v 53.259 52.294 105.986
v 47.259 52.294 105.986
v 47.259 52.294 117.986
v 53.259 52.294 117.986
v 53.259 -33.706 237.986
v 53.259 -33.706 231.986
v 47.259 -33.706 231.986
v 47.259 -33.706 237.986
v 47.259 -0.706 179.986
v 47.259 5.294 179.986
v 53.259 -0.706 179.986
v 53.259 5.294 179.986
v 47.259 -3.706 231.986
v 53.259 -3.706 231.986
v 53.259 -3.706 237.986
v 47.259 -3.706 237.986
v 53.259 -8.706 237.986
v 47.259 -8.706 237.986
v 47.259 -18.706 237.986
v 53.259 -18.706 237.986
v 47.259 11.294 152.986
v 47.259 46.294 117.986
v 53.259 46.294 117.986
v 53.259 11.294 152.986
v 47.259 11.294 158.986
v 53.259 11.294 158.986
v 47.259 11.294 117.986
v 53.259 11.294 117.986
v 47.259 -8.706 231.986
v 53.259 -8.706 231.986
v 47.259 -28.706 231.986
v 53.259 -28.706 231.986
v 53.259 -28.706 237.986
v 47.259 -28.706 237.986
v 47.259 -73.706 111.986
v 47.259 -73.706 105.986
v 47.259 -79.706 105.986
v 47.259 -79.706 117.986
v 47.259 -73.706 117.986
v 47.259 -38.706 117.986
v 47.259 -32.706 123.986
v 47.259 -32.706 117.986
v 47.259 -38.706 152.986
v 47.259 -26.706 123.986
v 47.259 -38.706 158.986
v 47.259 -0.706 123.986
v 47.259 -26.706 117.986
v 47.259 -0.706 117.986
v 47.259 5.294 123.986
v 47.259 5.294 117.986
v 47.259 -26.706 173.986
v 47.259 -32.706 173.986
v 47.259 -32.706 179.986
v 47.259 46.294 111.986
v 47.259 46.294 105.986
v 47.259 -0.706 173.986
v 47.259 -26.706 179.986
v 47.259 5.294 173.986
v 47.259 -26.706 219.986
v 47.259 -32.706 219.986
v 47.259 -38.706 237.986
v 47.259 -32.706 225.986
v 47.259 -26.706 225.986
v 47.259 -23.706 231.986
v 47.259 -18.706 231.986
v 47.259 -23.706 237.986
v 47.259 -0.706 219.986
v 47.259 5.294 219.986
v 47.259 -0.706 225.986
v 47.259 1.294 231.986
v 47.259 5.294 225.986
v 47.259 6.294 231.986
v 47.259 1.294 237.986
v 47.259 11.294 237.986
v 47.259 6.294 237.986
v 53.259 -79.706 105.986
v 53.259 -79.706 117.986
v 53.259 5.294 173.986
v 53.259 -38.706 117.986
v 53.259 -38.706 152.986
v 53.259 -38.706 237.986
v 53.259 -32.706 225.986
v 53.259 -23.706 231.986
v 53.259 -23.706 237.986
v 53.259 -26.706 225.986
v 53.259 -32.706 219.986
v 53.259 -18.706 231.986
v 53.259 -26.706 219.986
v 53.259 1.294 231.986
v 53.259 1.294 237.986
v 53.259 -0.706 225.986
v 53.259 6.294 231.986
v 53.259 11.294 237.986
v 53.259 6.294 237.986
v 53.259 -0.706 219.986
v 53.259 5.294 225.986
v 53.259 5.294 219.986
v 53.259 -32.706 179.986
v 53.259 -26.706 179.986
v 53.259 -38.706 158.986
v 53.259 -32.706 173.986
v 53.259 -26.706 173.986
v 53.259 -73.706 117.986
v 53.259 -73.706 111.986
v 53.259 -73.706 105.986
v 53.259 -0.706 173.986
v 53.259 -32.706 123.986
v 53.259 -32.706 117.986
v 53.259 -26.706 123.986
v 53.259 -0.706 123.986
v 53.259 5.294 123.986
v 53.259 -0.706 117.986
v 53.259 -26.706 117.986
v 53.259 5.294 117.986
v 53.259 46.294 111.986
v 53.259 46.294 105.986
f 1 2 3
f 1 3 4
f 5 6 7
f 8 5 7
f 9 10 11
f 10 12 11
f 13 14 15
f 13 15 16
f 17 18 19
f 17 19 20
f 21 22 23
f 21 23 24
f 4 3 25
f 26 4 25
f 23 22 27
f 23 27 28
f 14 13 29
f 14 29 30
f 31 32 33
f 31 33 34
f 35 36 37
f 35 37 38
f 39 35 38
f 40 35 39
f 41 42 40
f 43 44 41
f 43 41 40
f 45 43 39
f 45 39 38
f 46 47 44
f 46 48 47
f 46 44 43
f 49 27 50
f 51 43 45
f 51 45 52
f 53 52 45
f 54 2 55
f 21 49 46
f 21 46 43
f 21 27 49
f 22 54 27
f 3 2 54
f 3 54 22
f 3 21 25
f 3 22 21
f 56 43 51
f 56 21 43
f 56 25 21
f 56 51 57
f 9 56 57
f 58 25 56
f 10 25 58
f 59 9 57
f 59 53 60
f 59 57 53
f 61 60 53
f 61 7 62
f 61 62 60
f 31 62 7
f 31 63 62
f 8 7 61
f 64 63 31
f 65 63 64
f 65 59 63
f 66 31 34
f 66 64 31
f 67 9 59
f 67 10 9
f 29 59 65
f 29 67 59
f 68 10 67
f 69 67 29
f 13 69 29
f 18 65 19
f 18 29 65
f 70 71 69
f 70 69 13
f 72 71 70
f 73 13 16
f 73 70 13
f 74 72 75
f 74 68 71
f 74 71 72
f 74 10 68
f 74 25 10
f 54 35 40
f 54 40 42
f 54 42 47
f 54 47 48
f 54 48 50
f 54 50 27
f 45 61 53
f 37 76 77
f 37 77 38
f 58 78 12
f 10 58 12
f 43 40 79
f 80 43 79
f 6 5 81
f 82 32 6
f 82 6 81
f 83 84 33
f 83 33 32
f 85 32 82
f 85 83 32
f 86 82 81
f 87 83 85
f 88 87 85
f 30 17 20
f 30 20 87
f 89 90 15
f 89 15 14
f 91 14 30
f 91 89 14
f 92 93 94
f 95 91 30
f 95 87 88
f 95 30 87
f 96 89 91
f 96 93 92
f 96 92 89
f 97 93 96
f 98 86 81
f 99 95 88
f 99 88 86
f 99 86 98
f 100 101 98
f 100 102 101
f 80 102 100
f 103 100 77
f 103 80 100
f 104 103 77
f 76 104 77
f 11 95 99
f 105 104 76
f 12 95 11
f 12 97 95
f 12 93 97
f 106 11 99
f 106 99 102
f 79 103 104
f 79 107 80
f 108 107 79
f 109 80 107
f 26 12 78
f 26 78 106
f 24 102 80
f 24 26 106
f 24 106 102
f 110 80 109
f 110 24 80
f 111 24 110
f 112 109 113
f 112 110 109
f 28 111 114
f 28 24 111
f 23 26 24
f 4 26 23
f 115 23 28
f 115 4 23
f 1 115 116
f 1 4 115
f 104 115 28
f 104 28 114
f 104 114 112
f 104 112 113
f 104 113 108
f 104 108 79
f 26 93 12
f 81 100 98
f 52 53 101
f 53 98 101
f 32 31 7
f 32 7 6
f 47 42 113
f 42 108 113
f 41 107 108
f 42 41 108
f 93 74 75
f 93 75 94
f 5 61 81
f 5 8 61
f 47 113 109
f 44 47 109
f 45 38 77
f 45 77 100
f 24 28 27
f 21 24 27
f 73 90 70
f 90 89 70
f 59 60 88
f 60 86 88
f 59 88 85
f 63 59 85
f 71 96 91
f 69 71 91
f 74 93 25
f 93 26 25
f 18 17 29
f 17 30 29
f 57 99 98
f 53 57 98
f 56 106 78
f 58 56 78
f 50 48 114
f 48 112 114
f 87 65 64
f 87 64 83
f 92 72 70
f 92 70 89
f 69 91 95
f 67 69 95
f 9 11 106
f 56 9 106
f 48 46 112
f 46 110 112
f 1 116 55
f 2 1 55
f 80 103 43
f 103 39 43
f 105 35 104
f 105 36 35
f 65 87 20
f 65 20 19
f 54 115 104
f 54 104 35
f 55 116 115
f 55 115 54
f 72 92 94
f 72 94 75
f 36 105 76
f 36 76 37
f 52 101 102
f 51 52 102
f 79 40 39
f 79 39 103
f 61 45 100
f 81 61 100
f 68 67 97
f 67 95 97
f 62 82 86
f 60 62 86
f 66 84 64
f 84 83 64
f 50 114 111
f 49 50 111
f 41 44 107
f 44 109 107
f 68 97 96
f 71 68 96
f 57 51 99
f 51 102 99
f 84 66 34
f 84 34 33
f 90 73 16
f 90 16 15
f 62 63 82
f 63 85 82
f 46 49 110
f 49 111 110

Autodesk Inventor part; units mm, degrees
ref_plane "YZ Plane" through (0, 0, 0) normal (1, 0, 0) x (0, 1, 0)
ref_plane "XZ Plane" through (0, 0, 0) normal (0, 1, 0) x (-1, 0, 0)
ref_plane "XY Plane" through (0, 0, 0) normal (0, 0, 1) x (1, 0, 0)
ref_plane "Work Plane1" through (341.8591, 61.2945, 111.9858) normal (0, 0, 1) x (-1, 0, 0)
sketch "Sketch1" plane through (341.8591, 61.2945, 111.9858) normal (0, 0, 1) x (-1, 0, 0)
  line L0 (-28.8, 19.9) -> (-22.6, 19.9)
  line L1 (-28.8, 3) -> (-28.8, 19.9)
  line L2 (-28.8, 3) -> (262.8, 3)
  line L3 (262.8, 3) -> (262.8, -3)
  line L4 (262.8, -3) -> (-28.8, -3)
  line L5 (-28.8, -19.9) -> (-28.8, -3)
  line L6 (-13.3962, -19.9) -> (-28.8, -19.9)
  line L7 (-8.2, -22.9) -> (-13.3962, -19.9)
  line L8 (-8.2, -19.9) -> (-8.2, -22.9)
  arc A0 (-6.2, -19.9) -> (-8.2, -19.9) centre (-7.2, -19.9) ccw
  line L9 (-6.2, -22.9) -> (-6.2, -19.9)
  line L10 (-1.0038, -19.9) -> (-6.2, -22.9)
  line L11 (15.4038, -19.9) -> (-1.0038, -19.9)
  line L12 (20.6, -22.9) -> (15.4038, -19.9)
  line L13 (20.6, -19.9) -> (20.6, -22.9)
  arc A1 (22.6, -19.9) -> (20.6, -19.9) centre (21.6, -19.9) ccw
  line L14 (22.6, -22.9) -> (22.6, -19.9)
  line L15 (27.7962, -19.9) -> (22.6, -22.9)
  line L16 (44.2038, -19.9) -> (27.7962, -19.9)
  line L17 (49.4, -22.9) -> (44.2038, -19.9)
  line L18 (49.4, -19.9) -> (49.4, -22.9)
  arc A2 (51.4, -19.9) -> (49.4, -19.9) centre (50.4, -19.9) ccw
  line L19 (51.4, -22.9) -> (51.4, -19.9)
  line L20 (56.5962, -19.9) -> (51.4, -22.9)
  line L21 (73.0038, -19.9) -> (56.5962, -19.9)
  line L22 (78.2, -22.9) -> (73.0038, -19.9)
  line L23 (78.2, -19.9) -> (78.2, -22.9)
  arc A3 (80.2, -19.9) -> (78.2, -19.9) centre (79.2, -19.9) ccw
  line L24 (80.2, -22.9) -> (80.2, -19.9)
  line L25 (85.3962, -19.9) -> (80.2, -22.9)
  line L26 (101.8038, -19.9) -> (85.3962, -19.9)
  line L27 (107, -22.9) -> (101.8038, -19.9)
  line L28 (107, -19.9) -> (107, -22.9)
  arc A4 (109, -19.9) -> (107, -19.9) centre (108, -19.9) ccw
  line L29 (109, -22.9) -> (109, -19.9)
  line L30 (114.1962, -19.9) -> (109, -22.9)
  line L31 (130.6038, -19.9) -> (114.1962, -19.9)
  line L32 (135.8, -22.9) -> (130.6038, -19.9)
  line L33 (135.8, -19.9) -> (135.8, -22.9)
  arc A5 (137.8, -19.9) -> (135.8, -19.9) centre (136.8, -19.9) ccw
  line L34 (137.8, -22.9) -> (137.8, -19.9)
  line L35 (142.9962, -19.9) -> (137.8, -22.9)
  line L36 (159.4038, -19.9) -> (142.9962, -19.9)
  line L37 (164.6, -22.9) -> (159.4038, -19.9)
  line L38 (164.6, -19.9) -> (164.6, -22.9)
  arc A6 (166.6, -19.9) -> (164.6, -19.9) centre (165.6, -19.9) ccw
  line L39 (166.6, -22.9) -> (166.6, -19.9)
  line L40 (171.7962, -19.9) -> (166.6, -22.9)
  line L41 (188.2038, -19.9) -> (171.7962, -19.9)
  line L42 (193.4, -22.9) -> (188.2038, -19.9)
  line L43 (193.4, -19.9) -> (193.4, -22.9)
  arc A7 (195.4, -19.9) -> (193.4, -19.9) centre (194.4, -19.9) ccw
  line L44 (195.4, -22.9) -> (195.4, -19.9)
  line L45 (200.5962, -19.9) -> (195.4, -22.9)
  line L46 (217.0038, -19.9) -> (200.5962, -19.9)
  line L47 (222.2, -22.9) -> (217.0038, -19.9)
  line L48 (222.2, -19.9) -> (222.2, -22.9)
  arc A8 (224.2, -19.9) -> (222.2, -19.9) centre (223.2, -19.9) ccw
  line L49 (224.2, -22.9) -> (224.2, -19.9)
  line L50 (229.3962, -19.9) -> (224.2, -22.9)
  line L51 (245.8038, -19.9) -> (229.3962, -19.9)
  line L52 (251, -22.9) -> (245.8038, -19.9)
  line L53 (251, -19.9) -> (251, -22.9)
  arc A9 (253, -19.9) -> (251, -19.9) centre (252, -19.9) ccw
  line L54 (253, -22.9) -> (253, -19.9)
  line L55 (258.1962, -19.9) -> (253, -22.9)
  line L56 (274.6038, -19.9) -> (258.1962, -19.9)
  line L57 (279.8, -22.9) -> (274.6038, -19.9)
  line L58 (279.8, -19.9) -> (279.8, -22.9)
  arc A10 (281.8, -19.9) -> (279.8, -19.9) centre (280.8, -19.9) ccw
  line L59 (281.8, -22.9) -> (281.8, -19.9)
  line L60 (286.9962, -19.9) -> (281.8, -22.9)
  line L61 (303.4038, -19.9) -> (286.9962, -19.9)
  line L62 (308.6, -22.9) -> (303.4038, -19.9)
  line L63 (308.6, -19.9) -> (308.6, -22.9)
  arc A11 (310.6, -19.9) -> (308.6, -19.9) centre (309.6, -19.9) ccw
  line L64 (310.6, -22.9) -> (310.6, -19.9)
  line L65 (315.7962, -19.9) -> (310.6, -22.9)
  line L66 (332.2038, -19.9) -> (315.7962, -19.9)
  line L67 (337.4, -22.9) -> (332.2038, -19.9)
  line L68 (337.4, -19.9) -> (337.4, -22.9)
  arc A12 (339.4, -19.9) -> (337.4, -19.9) centre (338.4, -19.9) ccw
  line L69 (339.4, -22.9) -> (339.4, -19.9)
  line L70 (344.5962, -19.9) -> (339.4, -22.9)
  line L71 (361.0038, -19.9) -> (344.5962, -19.9)
  line L72 (366.2, -22.9) -> (361.0038, -19.9)
  line L73 (366.2, -19.9) -> (366.2, -22.9)
  arc A13 (368.2, -19.9) -> (366.2, -19.9) centre (367.2, -19.9) ccw
  line L74 (368.2, -22.9) -> (368.2, -19.9)
  line L75 (373.3962, -19.9) -> (368.2, -22.9)
  line L76 (389.8038, -19.9) -> (373.3962, -19.9)
  line L77 (395, -22.9) -> (389.8038, -19.9)
  line L78 (395, -19.9) -> (395, -22.9)
  arc A14 (397, -19.9) -> (395, -19.9) centre (396, -19.9) ccw
  line L79 (397, -22.9) -> (397, -19.9)
  line L80 (402.1962, -19.9) -> (397, -22.9)
  line L81 (418.6038, -19.9) -> (402.1962, -19.9)
  line L82 (423.8, -22.9) -> (418.6038, -19.9)
  line L83 (423.8, -19.9) -> (423.8, -22.9)
  arc A15 (425.8, -19.9) -> (423.8, -19.9) centre (424.8, -19.9) ccw
  line L84 (425.8, -22.9) -> (425.8, -19.9)
  line L85 (430.9962, -19.9) -> (425.8, -22.9)
  line L86 (447.4038, -19.9) -> (430.9962, -19.9)
  line L87 (452.6, -22.9) -> (447.4038, -19.9)
  line L88 (452.6, -19.9) -> (452.6, -22.9)
  arc A16 (454.6, -19.9) -> (452.6, -19.9) centre (453.6, -19.9) ccw
  line L89 (454.6, -22.9) -> (454.6, -19.9)
  line L90 (459.7962, -19.9) -> (454.6, -22.9)
  line L91 (476.2038, -19.9) -> (459.7962, -19.9)
  line L92 (481.4, -22.9) -> (476.2038, -19.9)
  line L93 (481.4, -19.9) -> (481.4, -22.9)
  arc A17 (483.4, -19.9) -> (481.4, -19.9) centre (482.4, -19.9) ccw
  line L94 (483.4, -22.9) -> (483.4, -19.9)
  line L95 (488.5962, -19.9) -> (483.4, -22.9)
  line L96 (505.0038, -19.9) -> (488.5962, -19.9)
  line L97 (510.2, -22.9) -> (505.0038, -19.9)
  line L98 (510.2, -19.9) -> (510.2, -22.9)
  arc A18 (512.2, -19.9) -> (510.2, -19.9) centre (511.2, -19.9) ccw
  line L99 (512.2, -22.9) -> (512.2, -19.9)
  line L100 (517.3962, -19.9) -> (512.2, -22.9)
  line L101 (533.8038, -19.9) -> (517.3962, -19.9)
  line L102 (539, -22.9) -> (533.8038, -19.9)
  line L103 (539, -19.9) -> (539, -22.9)
  arc A19 (541, -19.9) -> (539, -19.9) centre (540, -19.9) ccw
  line L104 (541, -22.9) -> (541, -19.9)
  line L105 (546.1962, -19.9) -> (541, -22.9)
  line L106 (546.1962, -19.9) -> (554.4, -19.9)
  line L107 (554.4, 19.9) -> (554.4, -19.9)
  line L108 (531.7962, 19.9) -> (554.4, 19.9)
  line L109 (526.6, 22.9) -> (531.7962, 19.9)
  line L110 (526.6, 19.9) -> (526.6, 22.9)
  arc A20 (524.6, 19.9) -> (526.6, 19.9) centre (525.6, 19.9) ccw
  line L111 (524.6, 22.9) -> (524.6, 19.9)
  line L112 (519.4038, 19.9) -> (524.6, 22.9)
  line L113 (502.9962, 19.9) -> (519.4038, 19.9)
  line L114 (497.8, 22.9) -> (502.9962, 19.9)
  line L115 (497.8, 19.9) -> (497.8, 22.9)
  arc A21 (495.8, 19.9) -> (497.8, 19.9) centre (496.8, 19.9) ccw
  line L116 (495.8, 22.9) -> (495.8, 19.9)
  line L117 (490.6038, 19.9) -> (495.8, 22.9)
  line L118 (474.1962, 19.9) -> (490.6038, 19.9)
  line L119 (469, 22.9) -> (474.1962, 19.9)
  line L120 (469, 19.9) -> (469, 22.9)
  arc A22 (467, 19.9) -> (469, 19.9) centre (468, 19.9) ccw
  line L121 (467, 22.9) -> (467, 19.9)
  line L122 (461.8038, 19.9) -> (467, 22.9)
  line L123 (445.3962, 19.9) -> (461.8038, 19.9)
  line L124 (440.2, 22.9) -> (445.3962, 19.9)
  line L125 (440.2, 19.9) -> (440.2, 22.9)
  arc A23 (438.2, 19.9) -> (440.2, 19.9) centre (439.2, 19.9) ccw
  line L126 (438.2, 22.9) -> (438.2, 19.9)
  line L127 (433.0038, 19.9) -> (438.2, 22.9)
  line L128 (416.5962, 19.9) -> (433.0038, 19.9)
  line L129 (411.4, 22.9) -> (416.5962, 19.9)
  line L130 (411.4, 19.9) -> (411.4, 22.9)
  arc A24 (409.4, 19.9) -> (411.4, 19.9) centre (410.4, 19.9) ccw
  line L131 (409.4, 22.9) -> (409.4, 19.9)
  line L132 (404.2038, 19.9) -> (409.4, 22.9)
  line L133 (387.7962, 19.9) -> (404.2038, 19.9)
  line L134 (382.6, 22.9) -> (387.7962, 19.9)
  line L135 (382.6, 19.9) -> (382.6, 22.9)
  arc A25 (380.6, 19.9) -> (382.6, 19.9) centre (381.6, 19.9) ccw
  line L136 (380.6, 22.9) -> (380.6, 19.9)
  line L137 (375.4038, 19.9) -> (380.6, 22.9)
  line L138 (358.9962, 19.9) -> (375.4038, 19.9)
  line L139 (353.8, 22.9) -> (358.9962, 19.9)
  line L140 (353.8, 19.9) -> (353.8, 22.9)
  arc A26 (351.8, 19.9) -> (353.8, 19.9) centre (352.8, 19.9) ccw
  line L141 (351.8, 22.9) -> (351.8, 19.9)
  line L142 (346.6038, 19.9) -> (351.8, 22.9)
  line L143 (330.1962, 19.9) -> (346.6038, 19.9)
  line L144 (325, 22.9) -> (330.1962, 19.9)
  line L145 (325, 19.9) -> (325, 22.9)
  arc A27 (323, 19.9) -> (325, 19.9) centre (324, 19.9) ccw
  line L146 (323, 22.9) -> (323, 19.9)
  line L147 (317.8038, 19.9) -> (323, 22.9)
  line L148 (301.3962, 19.9) -> (317.8038, 19.9)
  line L149 (296.2, 22.9) -> (301.3962, 19.9)
  line L150 (296.2, 19.9) -> (296.2, 22.9)
  arc A28 (294.2, 19.9) -> (296.2, 19.9) centre (295.2, 19.9) ccw
  line L151 (294.2, 22.9) -> (294.2, 19.9)
  line L152 (289.0038, 19.9) -> (294.2, 22.9)
  line L153 (272.5962, 19.9) -> (289.0038, 19.9)
  line L154 (267.4, 22.9) -> (272.5962, 19.9)
  line L155 (267.4, 19.9) -> (267.4, 22.9)
  arc A29 (265.4, 19.9) -> (267.4, 19.9) centre (266.4, 19.9) ccw
  line L156 (265.4, 22.9) -> (265.4, 19.9)
  line L157 (260.2038, 19.9) -> (265.4, 22.9)
  line L158 (243.7962, 19.9) -> (260.2038, 19.9)
  line L159 (238.6, 22.9) -> (243.7962, 19.9)
  line L160 (238.6, 19.9) -> (238.6, 22.9)
  arc A30 (236.6, 19.9) -> (238.6, 19.9) centre (237.6, 19.9) ccw
  line L161 (236.6, 22.9) -> (236.6, 19.9)
  line L162 (231.4038, 19.9) -> (236.6, 22.9)
  line L163 (214.9962, 19.9) -> (231.4038, 19.9)
  line L164 (209.8, 22.9) -> (214.9962, 19.9)
  line L165 (209.8, 19.9) -> (209.8, 22.9)
  arc A31 (207.8, 19.9) -> (209.8, 19.9) centre (208.8, 19.9) ccw
  line L166 (207.8, 22.9) -> (207.8, 19.9)
  line L167 (202.6038, 19.9) -> (207.8, 22.9)
  line L168 (186.1962, 19.9) -> (202.6038, 19.9)
  line L169 (181, 22.9) -> (186.1962, 19.9)
  line L170 (181, 19.9) -> (181, 22.9)
  arc A32 (179, 19.9) -> (181, 19.9) centre (180, 19.9) ccw
  line L171 (179, 22.9) -> (179, 19.9)
  line L172 (173.8038, 19.9) -> (179, 22.9)
  line L173 (157.3962, 19.9) -> (173.8038, 19.9)
  line L174 (152.2, 22.9) -> (157.3962, 19.9)
  line L175 (152.2, 19.9) -> (152.2, 22.9)
  arc A33 (150.2, 19.9) -> (152.2, 19.9) centre (151.2, 19.9) ccw
  line L176 (150.2, 22.9) -> (150.2, 19.9)
  line L177 (145.0038, 19.9) -> (150.2, 22.9)
  line L178 (128.5962, 19.9) -> (145.0038, 19.9)
  line L179 (123.4, 22.9) -> (128.5962, 19.9)
  line L180 (123.4, 19.9) -> (123.4, 22.9)
  arc A34 (121.4, 19.9) -> (123.4, 19.9) centre (122.4, 19.9) ccw
  line L181 (121.4, 22.9) -> (121.4, 19.9)
  line L182 (116.2038, 19.9) -> (121.4, 22.9)
  line L183 (99.7962, 19.9) -> (116.2038, 19.9)
  line L184 (94.6, 22.9) -> (99.7962, 19.9)
  line L185 (94.6, 19.9) -> (94.6, 22.9)
  arc A35 (92.6, 19.9) -> (94.6, 19.9) centre (93.6, 19.9) ccw
  line L186 (92.6, 22.9) -> (92.6, 19.9)
  line L187 (87.4038, 19.9) -> (92.6, 22.9)
  line L188 (70.9962, 19.9) -> (87.4038, 19.9)
  line L189 (65.8, 22.9) -> (70.9962, 19.9)
  line L190 (65.8, 19.9) -> (65.8, 22.9)
  arc A36 (63.8, 19.9) -> (65.8, 19.9) centre (64.8, 19.9) ccw
  line L191 (63.8, 22.9) -> (63.8, 19.9)
  line L192 (58.6038, 19.9) -> (63.8, 22.9)
  line L193 (42.1962, 19.9) -> (58.6038, 19.9)
  line L194 (37, 22.9) -> (42.1962, 19.9)
  line L195 (37, 19.9) -> (37, 22.9)
  arc A37 (35, 19.9) -> (37, 19.9) centre (36, 19.9) ccw
  line L196 (35, 22.9) -> (35, 19.9)
  line L197 (29.8038, 19.9) -> (35, 22.9)
  line L198 (13.3962, 19.9) -> (29.8038, 19.9)
  line L199 (8.2, 22.9) -> (13.3962, 19.9)
  line L200 (8.2, 19.9) -> (8.2, 22.9)
  arc A38 (6.2, 19.9) -> (8.2, 19.9) centre (7.2, 19.9) ccw
  line L201 (6.2, 22.9) -> (6.2, 19.9)
  line L202 (1.0038, 19.9) -> (6.2, 22.9)
  line L203 (-15.4038, 19.9) -> (1.0038, 19.9)
  line L204 (-20.6, 22.9) -> (-15.4038, 19.9)
  line L205 (-20.6, 19.9) -> (-20.6, 22.9)
  arc A39 (-22.6, 19.9) -> (-20.6, 19.9) centre (-21.6, 19.9) ccw
  line L206 (525, 9) -> (519, 9)
  line L207 (519, 9) -> (519, 15)
  line L208 (519, 15) -> (525, 15)
  line L209 (525, 15) -> (525, 9)
  line L210 (525, -9) -> (525, -15)
  line L211 (525, -15) -> (519, -15)
  line L212 (519, -15) -> (519, -9)
  line L213 (519, -9) -> (525, -9)
  line L214 (467.4, 9) -> (461.4, 9)
  line L215 (461.4, 9) -> (461.4, 15)
  line L216 (461.4, 15) -> (467.4, 15)
  line L217 (467.4, 15) -> (467.4, 9)
  line L218 (467.4, -9) -> (467.4, -15)
  line L219 (467.4, -15) -> (461.4, -15)
  line L220 (461.4, -15) -> (461.4, -9)
  line L221 (461.4, -9) -> (467.4, -9)
  line L222 (409.8, 9) -> (403.8, 9)
  line L223 (403.8, 9) -> (403.8, 15)
  line L224 (403.8, 15) -> (409.8, 15)
  line L225 (409.8, 15) -> (409.8, 9)
  line L226 (409.8, -9) -> (409.8, -15)
  line L227 (409.8, -15) -> (403.8, -15)
  line L228 (403.8, -15) -> (403.8, -9)
  line L229 (403.8, -9) -> (409.8, -9)
  line L230 (352.2, 9) -> (346.2, 9)
  line L231 (346.2, 9) -> (346.2, 15)
  line L232 (346.2, 15) -> (352.2, 15)
  line L233 (352.2, 15) -> (352.2, 9)
  line L234 (352.2, -9) -> (352.2, -15)
  line L235 (352.2, -15) -> (346.2, -15)
  line L236 (346.2, -15) -> (346.2, -9)
  line L237 (346.2, -9) -> (352.2, -9)
  line L238 (294.6, 9) -> (288.6, 9)
  line L239 (288.6, 9) -> (288.6, 15)
  line L240 (288.6, 15) -> (294.6, 15)
  line L241 (294.6, 15) -> (294.6, 9)
  line L242 (294.6, -9) -> (294.6, -15)
  line L243 (294.6, -15) -> (288.6, -15)
  line L244 (288.6, -15) -> (288.6, -9)
  line L245 (288.6, -9) -> (294.6, -9)
  line L246 (237, 9) -> (231, 9)
  line L247 (231, 9) -> (231, 15)
  line L248 (231, 15) -> (237, 15)
  line L249 (237, 15) -> (237, 9)
  line L250 (237, -9) -> (237, -15)
  line L251 (237, -15) -> (231, -15)
  line L252 (231, -15) -> (231, -9)
  line L253 (231, -9) -> (237, -9)
  line L254 (179.4, 9) -> (173.4, 9)
  line L255 (173.4, 9) -> (173.4, 15)
  line L256 (173.4, 15) -> (179.4, 15)
  line L257 (179.4, 15) -> (179.4, 9)
  line L258 (179.4, -9) -> (179.4, -15)
  line L259 (179.4, -15) -> (173.4, -15)
  line L260 (173.4, -15) -> (173.4, -9)
  line L261 (173.4, -9) -> (179.4, -9)
  line L262 (121.8, 9) -> (115.8, 9)
  line L263 (115.8, 9) -> (115.8, 15)
  line L264 (115.8, 15) -> (121.8, 15)
  line L265 (121.8, 15) -> (121.8, 9)
  line L266 (121.8, -9) -> (121.8, -15)
  line L267 (121.8, -15) -> (115.8, -15)
  line L268 (115.8, -15) -> (115.8, -9)
  line L269 (115.8, -9) -> (121.8, -9)
  line L270 (64.2, 9) -> (58.2, 9)
  line L271 (58.2, 9) -> (58.2, 15)
  line L272 (58.2, 15) -> (64.2, 15)
  line L273 (64.2, 15) -> (64.2, 9)
  line L274 (64.2, -9) -> (64.2, -15)
  line L275 (64.2, -15) -> (58.2, -15)
  line L276 (58.2, -15) -> (58.2, -9)
  line L277 (58.2, -9) -> (64.2, -9)
  line L278 (6.6, 9) -> (0.6, 9)
  line L279 (0.6, 9) -> (0.6, 15)
  line L280 (0.6, 15) -> (6.6, 15)
  line L281 (6.6, 15) -> (6.6, 9)
  line L282 (6.6, -9) -> (6.6, -15)
  line L283 (6.6, -15) -> (0.6, -15)
  line L284 (0.6, -15) -> (0.6, -9)
  line L285 (0.6, -9) -> (6.6, -9)
  line L286 (-28.8, 169.9) -> (-22.6, 169.9)
  line L287 (-28.8, 153) -> (-28.8, 169.9)
  line L288 (-28.8, 153) -> (262.8, 153)
  line L289 (262.8, 153) -> (262.8, 147)
  line L290 (262.8, 147) -> (-28.8, 147)
  line L291 (-28.8, 130.1) -> (-28.8, 147)
  line L292 (-13.3962, 130.1) -> (-28.8, 130.1)
  line L293 (-8.2, 127.1) -> (-13.3962, 130.1)
  line L294 (-8.2, 130.1) -> (-8.2, 127.1)
  arc A40 (-6.2, 130.1) -> (-8.2, 130.1) centre (-7.2, 130.1) ccw
  line L295 (-6.2, 127.1) -> (-6.2, 130.1)
  line L296 (-1.0038, 130.1) -> (-6.2, 127.1)
  line L297 (15.4038, 130.1) -> (-1.0038, 130.1)
  line L298 (20.6, 127.1) -> (15.4038, 130.1)
  line L299 (20.6, 130.1) -> (20.6, 127.1)
  arc A41 (22.6, 130.1) -> (20.6, 130.1) centre (21.6, 130.1) ccw
  line L300 (22.6, 127.1) -> (22.6, 130.1)
  line L301 (27.7962, 130.1) -> (22.6, 127.1)
  line L302 (44.2038, 130.1) -> (27.7962, 130.1)
  line L303 (49.4, 127.1) -> (44.2038, 130.1)
  line L304 (49.4, 130.1) -> (49.4, 127.1)
  arc A42 (51.4, 130.1) -> (49.4, 130.1) centre (50.4, 130.1) ccw
  line L305 (51.4, 127.1) -> (51.4, 130.1)
  line L306 (56.5962, 130.1) -> (51.4, 127.1)
  line L307 (73.0038, 130.1) -> (56.5962, 130.1)
  line L308 (78.2, 127.1) -> (73.0038, 130.1)
  line L309 (78.2, 130.1) -> (78.2, 127.1)
  arc A43 (80.2, 130.1) -> (78.2, 130.1) centre (79.2, 130.1) ccw
  line L310 (80.2, 127.1) -> (80.2, 130.1)
  line L311 (85.3962, 130.1) -> (80.2, 127.1)
  line L312 (101.8038, 130.1) -> (85.3962, 130.1)
  line L313 (107, 127.1) -> (101.8038, 130.1)
  line L314 (107, 130.1) -> (107, 127.1)
  arc A44 (109, 130.1) -> (107, 130.1) centre (108, 130.1) ccw
  line L315 (109, 127.1) -> (109, 130.1)
  line L316 (114.1962, 130.1) -> (109, 127.1)
  line L317 (130.6038, 130.1) -> (114.1962, 130.1)
  line L318 (135.8, 127.1) -> (130.6038, 130.1)
  line L319 (135.8, 130.1) -> (135.8, 127.1)
  arc A45 (137.8, 130.1) -> (135.8, 130.1) centre (136.8, 130.1) ccw
  line L320 (137.8, 127.1) -> (137.8, 130.1)
  line L321 (142.9962, 130.1) -> (137.8, 127.1)
  line L322 (159.4038, 130.1) -> (142.9962, 130.1)
  line L323 (164.6, 127.1) -> (159.4038, 130.1)
  line L324 (164.6, 130.1) -> (164.6, 127.1)
  arc A46 (166.6, 130.1) -> (164.6, 130.1) centre (165.6, 130.1) ccw
  line L325 (166.6, 127.1) -> (166.6, 130.1)
  line L326 (171.7962, 130.1) -> (166.6, 127.1)
  line L327 (188.2038, 130.1) -> (171.7962, 130.1)
  line L328 (193.4, 127.1) -> (188.2038, 130.1)
  line L329 (193.4, 130.1) -> (193.4, 127.1)
  arc A47 (195.4, 130.1) -> (193.4, 130.1) centre (194.4, 130.1) ccw
  line L330 (195.4, 127.1) -> (195.4, 130.1)
  line L331 (200.5962, 130.1) -> (195.4, 127.1)
  line L332 (217.0038, 130.1) -> (200.5962, 130.1)
  line L333 (222.2, 127.1) -> (217.0038, 130.1)
  line L334 (222.2, 130.1) -> (222.2, 127.1)
  arc A48 (224.2, 130.1) -> (222.2, 130.1) centre (223.2, 130.1) ccw
  line L335 (224.2, 127.1) -> (224.2, 130.1)
  line L336 (229.3962, 130.1) -> (224.2, 127.1)
  line L337 (245.8038, 130.1) -> (229.3962, 130.1)
  line L338 (251, 127.1) -> (245.8038, 130.1)
  line L339 (251, 130.1) -> (251, 127.1)
  arc A49 (253, 130.1) -> (251, 130.1) centre (252, 130.1) ccw
  line L340 (253, 127.1) -> (253, 130.1)
  line L341 (258.1962, 130.1) -> (253, 127.1)
  line L342 (274.6038, 130.1) -> (258.1962, 130.1)
  line L343 (279.8, 127.1) -> (274.6038, 130.1)
  line L344 (279.8, 130.1) -> (279.8, 127.1)
  arc A50 (281.8, 130.1) -> (279.8, 130.1) centre (280.8, 130.1) ccw
  line L345 (281.8, 127.1) -> (281.8, 130.1)
  line L346 (286.9962, 130.1) -> (281.8, 127.1)
  line L347 (303.4038, 130.1) -> (286.9962, 130.1)
  line L348 (308.6, 127.1) -> (303.4038, 130.1)
  line L349 (308.6, 130.1) -> (308.6, 127.1)
  arc A51 (310.6, 130.1) -> (308.6, 130.1) centre (309.6, 130.1) ccw
  line L350 (310.6, 127.1) -> (310.6, 130.1)
  line L351 (315.7962, 130.1) -> (310.6, 127.1)
  line L352 (332.2038, 130.1) -> (315.7962, 130.1)
  line L353 (337.4, 127.1) -> (332.2038, 130.1)
  line L354 (337.4, 130.1) -> (337.4, 127.1)
  arc A52 (339.4, 130.1) -> (337.4, 130.1) centre (338.4, 130.1) ccw
  line L355 (339.4, 127.1) -> (339.4, 130.1)
  line L356 (344.5962, 130.1) -> (339.4, 127.1)
  line L357 (361.0038, 130.1) -> (344.5962, 130.1)
  line L358 (366.2, 127.1) -> (361.0038, 130.1)
  line L359 (366.2, 130.1) -> (366.2, 127.1)
  arc A53 (368.2, 130.1) -> (366.2, 130.1) centre (367.2, 130.1) ccw
  line L360 (368.2, 127.1) -> (368.2, 130.1)
  line L361 (373.3962, 130.1) -> (368.2, 127.1)
  line L362 (389.8038, 130.1) -> (373.3962, 130.1)
  line L363 (395, 127.1) -> (389.8038, 130.1)
  line L364 (395, 130.1) -> (395, 127.1)
  arc A54 (397, 130.1) -> (395, 130.1) centre (396, 130.1) ccw
  line L365 (397, 127.1) -> (397, 130.1)
  line L366 (402.1962, 130.1) -> (397, 127.1)
  line L367 (418.6038, 130.1) -> (402.1962, 130.1)
  line L368 (423.8, 127.1) -> (418.6038, 130.1)
  line L369 (423.8, 130.1) -> (423.8, 127.1)
  arc A55 (425.8, 130.1) -> (423.8, 130.1) centre (424.8, 130.1) ccw
  line L370 (425.8, 127.1) -> (425.8, 130.1)
  line L371 (430.9962, 130.1) -> (425.8, 127.1)
  line L372 (447.4038, 130.1) -> (430.9962, 130.1)
  line L373 (452.6, 127.1) -> (447.4038, 130.1)
  line L374 (452.6, 130.1) -> (452.6, 127.1)
  arc A56 (454.6, 130.1) -> (452.6, 130.1) centre (453.6, 130.1) ccw
  line L375 (454.6, 127.1) -> (454.6, 130.1)
  line L376 (459.7962, 130.1) -> (454.6, 127.1)
  line L377 (476.2038, 130.1) -> (459.7962, 130.1)
  line L378 (481.4, 127.1) -> (476.2038, 130.1)
  line L379 (481.4, 130.1) -> (481.4, 127.1)
  arc A57 (483.4, 130.1) -> (481.4, 130.1) centre (482.4, 130.1) ccw
  line L380 (483.4, 127.1) -> (483.4, 130.1)
  line L381 (488.5962, 130.1) -> (483.4, 127.1)
  line L382 (505.0038, 130.1) -> (488.5962, 130.1)
  line L383 (510.2, 127.1) -> (505.0038, 130.1)
  line L384 (510.2, 130.1) -> (510.2, 127.1)
  arc A58 (512.2, 130.1) -> (510.2, 130.1) centre (511.2, 130.1) ccw
  line L385 (512.2, 127.1) -> (512.2, 130.1)
  line L386 (517.3962, 130.1) -> (512.2, 127.1)
  line L387 (533.8038, 130.1) -> (517.3962, 130.1)
  line L388 (539, 127.1) -> (533.8038, 130.1)
  line L389 (539, 130.1) -> (539, 127.1)
  arc A59 (541, 130.1) -> (539, 130.1) centre (540, 130.1) ccw
  line L390 (541, 127.1) -> (541, 130.1)
  line L391 (546.1962, 130.1) -> (541, 127.1)
  line L392 (546.1962, 130.1) -> (554.4, 130.1)
  line L393 (554.4, 169.9) -> (554.4, 130.1)
  line L394 (531.7962, 169.9) -> (554.4, 169.9)
  line L395 (526.6, 172.9) -> (531.7962, 169.9)
  line L396 (526.6, 169.9) -> (526.6, 172.9)
  arc A60 (524.6, 169.9) -> (526.6, 169.9) centre (525.6, 169.9) ccw
  line L397 (524.6, 172.9) -> (524.6, 169.9)
  line L398 (519.4038, 169.9) -> (524.6, 172.9)
  line L399 (502.9962, 169.9) -> (519.4038, 169.9)
  line L400 (497.8, 172.9) -> (502.9962, 169.9)
  line L401 (497.8, 169.9) -> (497.8, 172.9)
  arc A61 (495.8, 169.9) -> (497.8, 169.9) centre (496.8, 169.9) ccw
  line L402 (495.8, 172.9) -> (495.8, 169.9)
  line L403 (490.6038, 169.9) -> (495.8, 172.9)
  line L404 (474.1962, 169.9) -> (490.6038, 169.9)
  line L405 (469, 172.9) -> (474.1962, 169.9)
  line L406 (469, 169.9) -> (469, 172.9)
  arc A62 (467, 169.9) -> (469, 169.9) centre (468, 169.9) ccw
  line L407 (467, 172.9) -> (467, 169.9)
  line L408 (461.8038, 169.9) -> (467, 172.9)
  line L409 (445.3962, 169.9) -> (461.8038, 169.9)
  line L410 (440.2, 172.9) -> (445.3962, 169.9)
  line L411 (440.2, 169.9) -> (440.2, 172.9)
  arc A63 (438.2, 169.9) -> (440.2, 169.9) centre (439.2, 169.9) ccw
  line L412 (438.2, 172.9) -> (438.2, 169.9)
  line L413 (433.0038, 169.9) -> (438.2, 172.9)
  line L414 (416.5962, 169.9) -> (433.0038, 169.9)
  line L415 (411.4, 172.9) -> (416.5962, 169.9)
  line L416 (411.4, 169.9) -> (411.4, 172.9)
  arc A64 (409.4, 169.9) -> (411.4, 169.9) centre (410.4, 169.9) ccw
  line L417 (409.4, 172.9) -> (409.4, 169.9)
  line L418 (404.2038, 169.9) -> (409.4, 172.9)
  line L419 (387.7962, 169.9) -> (404.2038, 169.9)
  line L420 (382.6, 172.9) -> (387.7962, 169.9)
  line L421 (382.6, 169.9) -> (382.6, 172.9)
  arc A65 (380.6, 169.9) -> (382.6, 169.9) centre (381.6, 169.9) ccw
  line L422 (380.6, 172.9) -> (380.6, 169.9)
  line L423 (375.4038, 169.9) -> (380.6, 172.9)
  line L424 (358.9962, 169.9) -> (375.4038, 169.9)
  line L425 (353.8, 172.9) -> (358.9962, 169.9)
  line L426 (353.8, 169.9) -> (353.8, 172.9)
  arc A66 (351.8, 169.9) -> (353.8, 169.9) centre (352.8, 169.9) ccw
  line L427 (351.8, 172.9) -> (351.8, 169.9)
  line L428 (346.6038, 169.9) -> (351.8, 172.9)
  line L429 (330.1962, 169.9) -> (346.6038, 169.9)
  line L430 (325, 172.9) -> (330.1962, 169.9)
  line L431 (325, 169.9) -> (325, 172.9)
  arc A67 (323, 169.9) -> (325, 169.9) centre (324, 169.9) ccw
  line L432 (323, 172.9) -> (323, 169.9)
  line L433 (317.8038, 169.9) -> (323, 172.9)
  line L434 (301.3962, 169.9) -> (317.8038, 169.9)
  line L435 (296.2, 172.9) -> (301.3962, 169.9)
  line L436 (296.2, 169.9) -> (296.2, 172.9)
  arc A68 (294.2, 169.9) -> (296.2, 169.9) centre (295.2, 169.9) ccw
  line L437 (294.2, 172.9) -> (294.2, 169.9)
  line L438 (289.0038, 169.9) -> (294.2, 172.9)
  line L439 (272.5962, 169.9) -> (289.0038, 169.9)
  line L440 (267.4, 172.9) -> (272.5962, 169.9)
  line L441 (267.4, 169.9) -> (267.4, 172.9)
  arc A69 (265.4, 169.9) -> (267.4, 169.9) centre (266.4, 169.9) ccw
  line L442 (265.4, 172.9) -> (265.4, 169.9)
  line L443 (260.2038, 169.9) -> (265.4, 172.9)
  line L444 (243.7962, 169.9) -> (260.2038, 169.9)
  line L445 (238.6, 172.9) -> (243.7962, 169.9)
  line L446 (238.6, 169.9) -> (238.6, 172.9)
  arc A70 (236.6, 169.9) -> (238.6, 169.9) centre (237.6, 169.9) ccw
  line L447 (236.6, 172.9) -> (236.6, 169.9)
  line L448 (231.4038, 169.9) -> (236.6, 172.9)
  line L449 (214.9962, 169.9) -> (231.4038, 169.9)
  line L450 (209.8, 172.9) -> (214.9962, 169.9)
  line L451 (209.8, 169.9) -> (209.8, 172.9)
  arc A71 (207.8, 169.9) -> (209.8, 169.9) centre (208.8, 169.9) ccw
  line L452 (207.8, 172.9) -> (207.8, 169.9)
  line L453 (202.6038, 169.9) -> (207.8, 172.9)
  line L454 (186.1962, 169.9) -> (202.6038, 169.9)
  line L455 (181, 172.9) -> (186.1962, 169.9)
  line L456 (181, 169.9) -> (181, 172.9)
  arc A72 (179, 169.9) -> (181, 169.9) centre (180, 169.9) ccw
  line L457 (179, 172.9) -> (179, 169.9)
  line L458 (173.8038, 169.9) -> (179, 172.9)
  line L459 (157.3962, 169.9) -> (173.8038, 169.9)
  line L460 (152.2, 172.9) -> (157.3962, 169.9)
  line L461 (152.2, 169.9) -> (152.2, 172.9)
  arc A73 (150.2, 169.9) -> (152.2, 169.9) centre (151.2, 169.9) ccw
  line L462 (150.2, 172.9) -> (150.2, 169.9)
  line L463 (145.0038, 169.9) -> (150.2, 172.9)
  line L464 (128.5962, 169.9) -> (145.0038, 169.9)
  line L465 (123.4, 172.9) -> (128.5962, 169.9)
  line L466 (123.4, 169.9) -> (123.4, 172.9)
  arc A74 (121.4, 169.9) -> (123.4, 169.9) centre (122.4, 169.9) ccw
  line L467 (121.4, 172.9) -> (121.4, 169.9)
  line L468 (116.2038, 169.9) -> (121.4, 172.9)
  line L469 (99.7962, 169.9) -> (116.2038, 169.9)
  line L470 (94.6, 172.9) -> (99.7962, 169.9)
  line L471 (94.6, 169.9) -> (94.6, 172.9)
  arc A75 (92.6, 169.9) -> (94.6, 169.9) centre (93.6, 169.9) ccw
  line L472 (92.6, 172.9) -> (92.6, 169.9)
  line L473 (87.4038, 169.9) -> (92.6, 172.9)
  line L474 (70.9962, 169.9) -> (87.4038, 169.9)
  line L475 (65.8, 172.9) -> (70.9962, 169.9)
  line L476 (65.8, 169.9) -> (65.8, 172.9)
  arc A76 (63.8, 169.9) -> (65.8, 169.9) centre (64.8, 169.9) ccw
  line L477 (63.8, 172.9) -> (63.8, 169.9)
  line L478 (58.6038, 169.9) -> (63.8, 172.9)
  line L479 (42.1962, 169.9) -> (58.6038, 169.9)
  line L480 (37, 172.9) -> (42.1962, 169.9)
  line L481 (37, 169.9) -> (37, 172.9)
  arc A77 (35, 169.9) -> (37, 169.9) centre (36, 169.9) ccw
  line L482 (35, 172.9) -> (35, 169.9)
  line L483 (29.8038, 169.9) -> (35, 172.9)
  line L484 (13.3962, 169.9) -> (29.8038, 169.9)
  line L485 (8.2, 172.9) -> (13.3962, 169.9)
  line L486 (8.2, 169.9) -> (8.2, 172.9)
  arc A78 (6.2, 169.9) -> (8.2, 169.9) centre (7.2, 169.9) ccw
  line L487 (6.2, 172.9) -> (6.2, 169.9)
  line L488 (1.0038, 169.9) -> (6.2, 172.9)
  line L489 (-15.4038, 169.9) -> (1.0038, 169.9)
  line L490 (-20.6, 172.9) -> (-15.4038, 169.9)
  line L491 (-20.6, 169.9) -> (-20.6, 172.9)
  arc A79 (-22.6, 169.9) -> (-20.6, 169.9) centre (-21.6, 169.9) ccw
  line L492 (525, 159) -> (519, 159)
  line L493 (519, 159) -> (519, 165)
  line L494 (519, 165) -> (525, 165)
  line L495 (525, 165) -> (525, 159)
  line L496 (525, 141) -> (525, 135)
  line L497 (525, 135) -> (519, 135)
  line L498 (519, 135) -> (519, 141)
  line L499 (519, 141) -> (525, 141)
  line L500 (467.4, 159) -> (461.4, 159)
  line L501 (461.4, 159) -> (461.4, 165)
  line L502 (461.4, 165) -> (467.4, 165)
  line L503 (467.4, 165) -> (467.4, 159)
  line L504 (467.4, 141) -> (467.4, 135)
  line L505 (467.4, 135) -> (461.4, 135)
  line L506 (461.4, 135) -> (461.4, 141)
  line L507 (461.4, 141) -> (467.4, 141)
  line L508 (409.8, 159) -> (403.8, 159)
  line L509 (403.8, 159) -> (403.8, 165)
  line L510 (403.8, 165) -> (409.8, 165)
  line L511 (409.8, 165) -> (409.8, 159)
  line L512 (409.8, 141) -> (409.8, 135)
  line L513 (409.8, 135) -> (403.8, 135)
  line L514 (403.8, 135) -> (403.8, 141)
  line L515 (403.8, 141) -> (409.8, 141)
  line L516 (352.2, 159) -> (346.2, 159)
  line L517 (346.2, 159) -> (346.2, 165)
  line L518 (346.2, 165) -> (352.2, 165)
  line L519 (352.2, 165) -> (352.2, 159)
  line L520 (352.2, 141) -> (352.2, 135)
  line L521 (352.2, 135) -> (346.2, 135)
  line L522 (346.2, 135) -> (346.2, 141)
  line L523 (346.2, 141) -> (352.2, 141)
  line L524 (294.6, 159) -> (288.6, 159)
  line L525 (288.6, 159) -> (288.6, 165)
  line L526 (288.6, 165) -> (294.6, 165)
  line L527 (294.6, 165) -> (294.6, 159)
  line L528 (294.6, 141) -> (294.6, 135)
  line L529 (294.6, 135) -> (288.6, 135)
  line L530 (288.6, 135) -> (288.6, 141)
  line L531 (288.6, 141) -> (294.6, 141)
  line L532 (237, 159) -> (231, 159)
  line L533 (231, 159) -> (231, 165)
  line L534 (231, 165) -> (237, 165)
  line L535 (237, 165) -> (237, 159)
  line L536 (237, 141) -> (237, 135)
  line L537 (237, 135) -> (231, 135)
  line L538 (231, 135) -> (231, 141)
  line L539 (231, 141) -> (237, 141)
  line L540 (179.4, 159) -> (173.4, 159)
  line L541 (173.4, 159) -> (173.4, 165)
  line L542 (173.4, 165) -> (179.4, 165)
  line L543 (179.4, 165) -> (179.4, 159)
  line L544 (179.4, 141) -> (179.4, 135)
  line L545 (179.4, 135) -> (173.4, 135)
  line L546 (173.4, 135) -> (173.4, 141)
  line L547 (173.4, 141) -> (179.4, 141)
  line L548 (121.8, 159) -> (115.8, 159)
  line L549 (115.8, 159) -> (115.8, 165)
  line L550 (115.8, 165) -> (121.8, 165)
  line L551 (121.8, 165) -> (121.8, 159)
  line L552 (121.8, 141) -> (121.8, 135)
  line L553 (121.8, 135) -> (115.8, 135)
  line L554 (115.8, 135) -> (115.8, 141)
  line L555 (115.8, 141) -> (121.8, 141)
  line L556 (64.2, 159) -> (58.2, 159)
  line L557 (58.2, 159) -> (58.2, 165)
  line L558 (58.2, 165) -> (64.2, 165)
  line L559 (64.2, 165) -> (64.2, 159)
  line L560 (64.2, 141) -> (64.2, 135)
  line L561 (64.2, 135) -> (58.2, 135)
  line L562 (58.2, 135) -> (58.2, 141)
  line L563 (58.2, 141) -> (64.2, 141)
  line L564 (6.6, 159) -> (0.6, 159)
  line L565 (0.6, 159) -> (0.6, 165)
  line L566 (0.6, 165) -> (6.6, 165)
  line L567 (6.6, 165) -> (6.6, 159)
  line L568 (6.6, 141) -> (6.6, 135)
  line L569 (6.6, 135) -> (0.6, 135)
  line L570 (0.6, 135) -> (0.6, 141)
  line L571 (0.6, 141) -> (6.6, 141)
  point P0 (341.8591, 61.2945)
extrude "Extrusion1" add sketch "Sketch1" along normal blind 6 and the other way blind 6 contours L238 L239 L240 L241 | L528 L529 L530 L531
sketch "Sketch3" plane through (47.2591, 46.2945, 117.9858) normal (0, -1, 0) x (1, 0, 0)
  line L0 (0, 0) -> (6, 0)
  line L1 (0, 0) -> (6, 0)
  line L2 (6, 0) -> (6, -6)
  line L3 (6, -6) -> (0, -6)
  line L4 (0, -6) -> (0, 0)
  point P0 (-47.2591, -117.9858)
  dimension "d4" = 6
  dimension "d5" = 6
extrude "Extrusion2" add sketch "Sketch3" along normal up to next
sketch "Sketch4" plane through (341.8591, 61.2945, 117.9858) normal (0, 0, 1) x (1, 0, 0)
  line L0 (-294.6, -15) -> (-294.6, -135)
  line L1 (-288.6, -15) -> (-288.6, -135)
  line L2 (-294.6, -100) -> (-288.6, -100)
  line L3 (-288.6, -100) -> (-288.6, -50)
  line L4 (-288.6, -50) -> (-294.6, -50)
  line L5 (-294.6, -50) -> (-294.6, -100)
  line L6 (-288.6, -9) -> (-294.6, -9)
  point P0 (-341.8591, -61.2945)
  point P1 (-291.6, -50)
  point P2 (-291.6, -100)
  point P3 (-291.6, -9)
  point P4 (-294.6, -50)
  dimension "d8" = 50
  dimension "d9" = 41
extrude "Extrusion3" add sketch "Sketch4" along normal blind 114
sketch "Sketch5" plane through (47.2591, 46.2945, 105.9858) normal (-1, 0, 0) x (0, 0, 1)
  line L0 (0, -120) -> (6, -120)
  line L1 (6, -120) -> (12, -120)
  line L2 (12, -126) -> (12, -85)
  line L3 (0, 0) -> (6, 0)
  line L4 (6, 0) -> (12.4408, 0)
  line L5 (12, -120) -> (47, -85)
  line L6 (12, -85) -> (126, -85)
  line L7 (12, -120) -> (61.4975, -120) construction
  line L8 (12, -126) -> (53, -85)
  line L9 (12, -126) -> (12, -120)
  line L10 (47, -85) -> (53, -85)
  line L11 (12.4408, 0) -> (61.3149, 0) construction
  line L12 (12, 0) -> (47, -35)
  line L13 (12, -35) -> (126, -35)
  line L14 (0, 6) -> (12, 6)
  line L15 (12, 6) -> (53, -35)
  line L16 (53, -35) -> (47, -35)
  line L17 (12, 0) -> (12, 6)
  point P0 (-105.9858, -46.2945)
  point P1 (53, -35)
  dimension "d12" = 45
extrude "Extrusion4" add sketch "Sketch5" against normal blind 6 contours L2 L5 L6 L8 | L17 L15 L13 L12
sketch "Sketch9" plane through (341.8591, 61.2945, 231.9858) normal (0, 0, 1) x (1, 0, 0)
  line L0 (-294.6, -100) -> (-288.6, -100)
  line L1 (-288.6, -15) -> (-288.6, -135)
  line L2 (-294.6, -100) -> (-288.6, -100)
  line L3 (-288.6, -100) -> (-288.6, -95)
  line L4 (-288.6, -95) -> (-294.6, -95)
  line L5 (-294.6, -95) -> (-294.6, -100)
  line L6 (-294.6, -95) -> (-288.6, -95)
  line L7 (-288.6, -95) -> (-288.6, -90)
  line L8 (-288.6, -90) -> (-294.6, -90)
  line L9 (-294.6, -90) -> (-294.6, -95)
  line L10 (-294.6, -90) -> (-288.6, -90)
  line L11 (-288.6, -90) -> (-288.6, -85)
  line L12 (-288.6, -85) -> (-294.6, -85)
  line L13 (-294.6, -85) -> (-294.6, -90)
  line L14 (-294.6, -85) -> (-288.6, -85)
  line L15 (-288.6, -85) -> (-288.6, -80)
  line L16 (-288.6, -80) -> (-294.6, -80)
  line L17 (-294.6, -80) -> (-294.6, -85)
  line L18 (-294.6, -80) -> (-288.6, -80)
  line L19 (-288.6, -80) -> (-288.6, -75)
  line L20 (-288.6, -75) -> (-294.6, -75)
  line L21 (-294.6, -75) -> (-294.6, -80)
  line L22 (-294.6, -75) -> (-288.6, -75)
  line L23 (-288.6, -75) -> (-288.6, -70)
  line L24 (-288.6, -70) -> (-294.6, -70)
  line L25 (-294.6, -70) -> (-294.6, -75)
  line L26 (-294.6, -70) -> (-288.6, -70)
  line L27 (-288.6, -70) -> (-288.6, -65)
  line L28 (-288.6, -65) -> (-294.6, -65)
  line L29 (-294.6, -65) -> (-294.6, -70)
  line L30 (-294.6, -65) -> (-288.6, -65)
  line L31 (-288.6, -65) -> (-288.6, -60)
  line L32 (-288.6, -60) -> (-294.6, -60)
  line L33 (-294.6, -60) -> (-294.6, -65)
  line L34 (-294.6, -60) -> (-288.6, -60)
  line L35 (-288.6, -60) -> (-288.6, -55)
  line L36 (-288.6, -55) -> (-294.6, -55)
  line L37 (-294.6, -55) -> (-294.6, -60)
  line L38 (-294.6, -55) -> (-288.6, -55)
  line L39 (-288.6, -55) -> (-288.6, -50)
  line L40 (-288.6, -50) -> (-294.6, -50)
  line L41 (-294.6, -50) -> (-294.6, -55)
  point P0 (-341.8591, -61.2945)
  point P1 (-294.6, -55)
  point P2 (-288.6, -55)
  point P3 (-288.6, -50)
  point P4 (-294.6, -75)
  point P5 (-294.6, -80)
  point P6 (-288.6, -70)
  point P7 (-294.6, -90)
  point P8 (-288.6, -90)
  dimension "d35" = 5
  dimension "d38" = 5
extrude "Extrusion8" add sketch "Sketch9" along normal blind 6 contours L5 L4 L1 L0 | L13 L12 L1 L8 | L21 L20 L1 L16 | L25 L24 L1 L20 | L33 L32 L1 L28 | L41 L40 L1 L36
sketch "Sketch10" plane through (53.2591, -79.7055, 105.9858) normal (1, 0, 0) x (0, 0, -1)
  line L0 (-120, 47) -> (-114, 47)
  line L1 (-114, 47) -> (-114, 53)
  line L2 (-114, 53) -> (-120, 53)
  line L3 (-120, 53) -> (-120, 47)
  line L4 (-53, 41) -> (-132, 41)
  line L5 (-126, 46) -> (-126, 51)
  line L6 (-68, 53) -> (-74, 53)
  line L7 (-74, 53) -> (-74, 47)
  line L8 (-74, 47) -> (-68, 47)
  line L9 (-68, 47) -> (-68, 53)
  line L10 (-68, 79) -> (-68, 85)
  line L11 (-68, 85) -> (-74, 85)
  line L12 (-74, 85) -> (-74, 79)
  line L13 (-74, 79) -> (-68, 79)
  line L14 (-114, 79) -> (-114, 85)
  line L15 (-120, 79) -> (-114, 79)
  line L16 (-114, 85) -> (-120, 85)
  line L17 (-120, 85) -> (-120, 79)
  point P0 (105.9858, 79.7055)
  point P1 (-71, 47)
  point P2 (-114, 50)
  point P3 (-74, 50)
  point P4 (-71, 79)
  point P5 (-74, 82)
  point P6 (-114, 82)
  dimension "d45" = 6
  dimension "d46" = 6
  dimension "d47" = 6
  dimension "d48" = 6
  dimension "d49" = 6
  dimension "d50" = 6
  dimension "d51" = 6
  dimension "d52" = 40
  dimension "d55" = 32
extrude "Extrusion9" cut sketch "Sketch10" against normal blind 6
sketch "Sketch11" plane through (53.2591, -79.7055, 105.9858) normal (1, 0, 0) x (0, 0, -1)
  line L0 (-12, 85) -> (-18, 85)
  line L1 (-18, 85) -> (-18, 79)
  line L2 (-18, 79) -> (-12, 79)
  line L3 (-12, 79) -> (-12, 85)
  line L4 (-6, 126) -> (-6, 6)
  line L5 (-12, 91) -> (-47, 91)
  line L6 (-12, 53) -> (-18, 53)
  line L7 (-18, 53) -> (-18, 47)
  line L8 (-18, 47) -> (-12, 47)
  line L9 (-12, 47) -> (-12, 53)
  line L10 (-12, 41) -> (-47, 41)
  point P0 (105.9858, 79.7055)
  point P1 (-15, 47)
  dimension "d62" = 6
  dimension "d63" = 6
  dimension "d64" = 6
  dimension "d65" = 6
  dimension "d66" = 6
  dimension "d67" = 6
  dimension "d68" = 6
  dimension "d69" = 6
extrude "Extrusion10" cut sketch "Sketch11" against normal blind 6
equation "\"d51\" = d47"
properties part number "FootTopLarge"
